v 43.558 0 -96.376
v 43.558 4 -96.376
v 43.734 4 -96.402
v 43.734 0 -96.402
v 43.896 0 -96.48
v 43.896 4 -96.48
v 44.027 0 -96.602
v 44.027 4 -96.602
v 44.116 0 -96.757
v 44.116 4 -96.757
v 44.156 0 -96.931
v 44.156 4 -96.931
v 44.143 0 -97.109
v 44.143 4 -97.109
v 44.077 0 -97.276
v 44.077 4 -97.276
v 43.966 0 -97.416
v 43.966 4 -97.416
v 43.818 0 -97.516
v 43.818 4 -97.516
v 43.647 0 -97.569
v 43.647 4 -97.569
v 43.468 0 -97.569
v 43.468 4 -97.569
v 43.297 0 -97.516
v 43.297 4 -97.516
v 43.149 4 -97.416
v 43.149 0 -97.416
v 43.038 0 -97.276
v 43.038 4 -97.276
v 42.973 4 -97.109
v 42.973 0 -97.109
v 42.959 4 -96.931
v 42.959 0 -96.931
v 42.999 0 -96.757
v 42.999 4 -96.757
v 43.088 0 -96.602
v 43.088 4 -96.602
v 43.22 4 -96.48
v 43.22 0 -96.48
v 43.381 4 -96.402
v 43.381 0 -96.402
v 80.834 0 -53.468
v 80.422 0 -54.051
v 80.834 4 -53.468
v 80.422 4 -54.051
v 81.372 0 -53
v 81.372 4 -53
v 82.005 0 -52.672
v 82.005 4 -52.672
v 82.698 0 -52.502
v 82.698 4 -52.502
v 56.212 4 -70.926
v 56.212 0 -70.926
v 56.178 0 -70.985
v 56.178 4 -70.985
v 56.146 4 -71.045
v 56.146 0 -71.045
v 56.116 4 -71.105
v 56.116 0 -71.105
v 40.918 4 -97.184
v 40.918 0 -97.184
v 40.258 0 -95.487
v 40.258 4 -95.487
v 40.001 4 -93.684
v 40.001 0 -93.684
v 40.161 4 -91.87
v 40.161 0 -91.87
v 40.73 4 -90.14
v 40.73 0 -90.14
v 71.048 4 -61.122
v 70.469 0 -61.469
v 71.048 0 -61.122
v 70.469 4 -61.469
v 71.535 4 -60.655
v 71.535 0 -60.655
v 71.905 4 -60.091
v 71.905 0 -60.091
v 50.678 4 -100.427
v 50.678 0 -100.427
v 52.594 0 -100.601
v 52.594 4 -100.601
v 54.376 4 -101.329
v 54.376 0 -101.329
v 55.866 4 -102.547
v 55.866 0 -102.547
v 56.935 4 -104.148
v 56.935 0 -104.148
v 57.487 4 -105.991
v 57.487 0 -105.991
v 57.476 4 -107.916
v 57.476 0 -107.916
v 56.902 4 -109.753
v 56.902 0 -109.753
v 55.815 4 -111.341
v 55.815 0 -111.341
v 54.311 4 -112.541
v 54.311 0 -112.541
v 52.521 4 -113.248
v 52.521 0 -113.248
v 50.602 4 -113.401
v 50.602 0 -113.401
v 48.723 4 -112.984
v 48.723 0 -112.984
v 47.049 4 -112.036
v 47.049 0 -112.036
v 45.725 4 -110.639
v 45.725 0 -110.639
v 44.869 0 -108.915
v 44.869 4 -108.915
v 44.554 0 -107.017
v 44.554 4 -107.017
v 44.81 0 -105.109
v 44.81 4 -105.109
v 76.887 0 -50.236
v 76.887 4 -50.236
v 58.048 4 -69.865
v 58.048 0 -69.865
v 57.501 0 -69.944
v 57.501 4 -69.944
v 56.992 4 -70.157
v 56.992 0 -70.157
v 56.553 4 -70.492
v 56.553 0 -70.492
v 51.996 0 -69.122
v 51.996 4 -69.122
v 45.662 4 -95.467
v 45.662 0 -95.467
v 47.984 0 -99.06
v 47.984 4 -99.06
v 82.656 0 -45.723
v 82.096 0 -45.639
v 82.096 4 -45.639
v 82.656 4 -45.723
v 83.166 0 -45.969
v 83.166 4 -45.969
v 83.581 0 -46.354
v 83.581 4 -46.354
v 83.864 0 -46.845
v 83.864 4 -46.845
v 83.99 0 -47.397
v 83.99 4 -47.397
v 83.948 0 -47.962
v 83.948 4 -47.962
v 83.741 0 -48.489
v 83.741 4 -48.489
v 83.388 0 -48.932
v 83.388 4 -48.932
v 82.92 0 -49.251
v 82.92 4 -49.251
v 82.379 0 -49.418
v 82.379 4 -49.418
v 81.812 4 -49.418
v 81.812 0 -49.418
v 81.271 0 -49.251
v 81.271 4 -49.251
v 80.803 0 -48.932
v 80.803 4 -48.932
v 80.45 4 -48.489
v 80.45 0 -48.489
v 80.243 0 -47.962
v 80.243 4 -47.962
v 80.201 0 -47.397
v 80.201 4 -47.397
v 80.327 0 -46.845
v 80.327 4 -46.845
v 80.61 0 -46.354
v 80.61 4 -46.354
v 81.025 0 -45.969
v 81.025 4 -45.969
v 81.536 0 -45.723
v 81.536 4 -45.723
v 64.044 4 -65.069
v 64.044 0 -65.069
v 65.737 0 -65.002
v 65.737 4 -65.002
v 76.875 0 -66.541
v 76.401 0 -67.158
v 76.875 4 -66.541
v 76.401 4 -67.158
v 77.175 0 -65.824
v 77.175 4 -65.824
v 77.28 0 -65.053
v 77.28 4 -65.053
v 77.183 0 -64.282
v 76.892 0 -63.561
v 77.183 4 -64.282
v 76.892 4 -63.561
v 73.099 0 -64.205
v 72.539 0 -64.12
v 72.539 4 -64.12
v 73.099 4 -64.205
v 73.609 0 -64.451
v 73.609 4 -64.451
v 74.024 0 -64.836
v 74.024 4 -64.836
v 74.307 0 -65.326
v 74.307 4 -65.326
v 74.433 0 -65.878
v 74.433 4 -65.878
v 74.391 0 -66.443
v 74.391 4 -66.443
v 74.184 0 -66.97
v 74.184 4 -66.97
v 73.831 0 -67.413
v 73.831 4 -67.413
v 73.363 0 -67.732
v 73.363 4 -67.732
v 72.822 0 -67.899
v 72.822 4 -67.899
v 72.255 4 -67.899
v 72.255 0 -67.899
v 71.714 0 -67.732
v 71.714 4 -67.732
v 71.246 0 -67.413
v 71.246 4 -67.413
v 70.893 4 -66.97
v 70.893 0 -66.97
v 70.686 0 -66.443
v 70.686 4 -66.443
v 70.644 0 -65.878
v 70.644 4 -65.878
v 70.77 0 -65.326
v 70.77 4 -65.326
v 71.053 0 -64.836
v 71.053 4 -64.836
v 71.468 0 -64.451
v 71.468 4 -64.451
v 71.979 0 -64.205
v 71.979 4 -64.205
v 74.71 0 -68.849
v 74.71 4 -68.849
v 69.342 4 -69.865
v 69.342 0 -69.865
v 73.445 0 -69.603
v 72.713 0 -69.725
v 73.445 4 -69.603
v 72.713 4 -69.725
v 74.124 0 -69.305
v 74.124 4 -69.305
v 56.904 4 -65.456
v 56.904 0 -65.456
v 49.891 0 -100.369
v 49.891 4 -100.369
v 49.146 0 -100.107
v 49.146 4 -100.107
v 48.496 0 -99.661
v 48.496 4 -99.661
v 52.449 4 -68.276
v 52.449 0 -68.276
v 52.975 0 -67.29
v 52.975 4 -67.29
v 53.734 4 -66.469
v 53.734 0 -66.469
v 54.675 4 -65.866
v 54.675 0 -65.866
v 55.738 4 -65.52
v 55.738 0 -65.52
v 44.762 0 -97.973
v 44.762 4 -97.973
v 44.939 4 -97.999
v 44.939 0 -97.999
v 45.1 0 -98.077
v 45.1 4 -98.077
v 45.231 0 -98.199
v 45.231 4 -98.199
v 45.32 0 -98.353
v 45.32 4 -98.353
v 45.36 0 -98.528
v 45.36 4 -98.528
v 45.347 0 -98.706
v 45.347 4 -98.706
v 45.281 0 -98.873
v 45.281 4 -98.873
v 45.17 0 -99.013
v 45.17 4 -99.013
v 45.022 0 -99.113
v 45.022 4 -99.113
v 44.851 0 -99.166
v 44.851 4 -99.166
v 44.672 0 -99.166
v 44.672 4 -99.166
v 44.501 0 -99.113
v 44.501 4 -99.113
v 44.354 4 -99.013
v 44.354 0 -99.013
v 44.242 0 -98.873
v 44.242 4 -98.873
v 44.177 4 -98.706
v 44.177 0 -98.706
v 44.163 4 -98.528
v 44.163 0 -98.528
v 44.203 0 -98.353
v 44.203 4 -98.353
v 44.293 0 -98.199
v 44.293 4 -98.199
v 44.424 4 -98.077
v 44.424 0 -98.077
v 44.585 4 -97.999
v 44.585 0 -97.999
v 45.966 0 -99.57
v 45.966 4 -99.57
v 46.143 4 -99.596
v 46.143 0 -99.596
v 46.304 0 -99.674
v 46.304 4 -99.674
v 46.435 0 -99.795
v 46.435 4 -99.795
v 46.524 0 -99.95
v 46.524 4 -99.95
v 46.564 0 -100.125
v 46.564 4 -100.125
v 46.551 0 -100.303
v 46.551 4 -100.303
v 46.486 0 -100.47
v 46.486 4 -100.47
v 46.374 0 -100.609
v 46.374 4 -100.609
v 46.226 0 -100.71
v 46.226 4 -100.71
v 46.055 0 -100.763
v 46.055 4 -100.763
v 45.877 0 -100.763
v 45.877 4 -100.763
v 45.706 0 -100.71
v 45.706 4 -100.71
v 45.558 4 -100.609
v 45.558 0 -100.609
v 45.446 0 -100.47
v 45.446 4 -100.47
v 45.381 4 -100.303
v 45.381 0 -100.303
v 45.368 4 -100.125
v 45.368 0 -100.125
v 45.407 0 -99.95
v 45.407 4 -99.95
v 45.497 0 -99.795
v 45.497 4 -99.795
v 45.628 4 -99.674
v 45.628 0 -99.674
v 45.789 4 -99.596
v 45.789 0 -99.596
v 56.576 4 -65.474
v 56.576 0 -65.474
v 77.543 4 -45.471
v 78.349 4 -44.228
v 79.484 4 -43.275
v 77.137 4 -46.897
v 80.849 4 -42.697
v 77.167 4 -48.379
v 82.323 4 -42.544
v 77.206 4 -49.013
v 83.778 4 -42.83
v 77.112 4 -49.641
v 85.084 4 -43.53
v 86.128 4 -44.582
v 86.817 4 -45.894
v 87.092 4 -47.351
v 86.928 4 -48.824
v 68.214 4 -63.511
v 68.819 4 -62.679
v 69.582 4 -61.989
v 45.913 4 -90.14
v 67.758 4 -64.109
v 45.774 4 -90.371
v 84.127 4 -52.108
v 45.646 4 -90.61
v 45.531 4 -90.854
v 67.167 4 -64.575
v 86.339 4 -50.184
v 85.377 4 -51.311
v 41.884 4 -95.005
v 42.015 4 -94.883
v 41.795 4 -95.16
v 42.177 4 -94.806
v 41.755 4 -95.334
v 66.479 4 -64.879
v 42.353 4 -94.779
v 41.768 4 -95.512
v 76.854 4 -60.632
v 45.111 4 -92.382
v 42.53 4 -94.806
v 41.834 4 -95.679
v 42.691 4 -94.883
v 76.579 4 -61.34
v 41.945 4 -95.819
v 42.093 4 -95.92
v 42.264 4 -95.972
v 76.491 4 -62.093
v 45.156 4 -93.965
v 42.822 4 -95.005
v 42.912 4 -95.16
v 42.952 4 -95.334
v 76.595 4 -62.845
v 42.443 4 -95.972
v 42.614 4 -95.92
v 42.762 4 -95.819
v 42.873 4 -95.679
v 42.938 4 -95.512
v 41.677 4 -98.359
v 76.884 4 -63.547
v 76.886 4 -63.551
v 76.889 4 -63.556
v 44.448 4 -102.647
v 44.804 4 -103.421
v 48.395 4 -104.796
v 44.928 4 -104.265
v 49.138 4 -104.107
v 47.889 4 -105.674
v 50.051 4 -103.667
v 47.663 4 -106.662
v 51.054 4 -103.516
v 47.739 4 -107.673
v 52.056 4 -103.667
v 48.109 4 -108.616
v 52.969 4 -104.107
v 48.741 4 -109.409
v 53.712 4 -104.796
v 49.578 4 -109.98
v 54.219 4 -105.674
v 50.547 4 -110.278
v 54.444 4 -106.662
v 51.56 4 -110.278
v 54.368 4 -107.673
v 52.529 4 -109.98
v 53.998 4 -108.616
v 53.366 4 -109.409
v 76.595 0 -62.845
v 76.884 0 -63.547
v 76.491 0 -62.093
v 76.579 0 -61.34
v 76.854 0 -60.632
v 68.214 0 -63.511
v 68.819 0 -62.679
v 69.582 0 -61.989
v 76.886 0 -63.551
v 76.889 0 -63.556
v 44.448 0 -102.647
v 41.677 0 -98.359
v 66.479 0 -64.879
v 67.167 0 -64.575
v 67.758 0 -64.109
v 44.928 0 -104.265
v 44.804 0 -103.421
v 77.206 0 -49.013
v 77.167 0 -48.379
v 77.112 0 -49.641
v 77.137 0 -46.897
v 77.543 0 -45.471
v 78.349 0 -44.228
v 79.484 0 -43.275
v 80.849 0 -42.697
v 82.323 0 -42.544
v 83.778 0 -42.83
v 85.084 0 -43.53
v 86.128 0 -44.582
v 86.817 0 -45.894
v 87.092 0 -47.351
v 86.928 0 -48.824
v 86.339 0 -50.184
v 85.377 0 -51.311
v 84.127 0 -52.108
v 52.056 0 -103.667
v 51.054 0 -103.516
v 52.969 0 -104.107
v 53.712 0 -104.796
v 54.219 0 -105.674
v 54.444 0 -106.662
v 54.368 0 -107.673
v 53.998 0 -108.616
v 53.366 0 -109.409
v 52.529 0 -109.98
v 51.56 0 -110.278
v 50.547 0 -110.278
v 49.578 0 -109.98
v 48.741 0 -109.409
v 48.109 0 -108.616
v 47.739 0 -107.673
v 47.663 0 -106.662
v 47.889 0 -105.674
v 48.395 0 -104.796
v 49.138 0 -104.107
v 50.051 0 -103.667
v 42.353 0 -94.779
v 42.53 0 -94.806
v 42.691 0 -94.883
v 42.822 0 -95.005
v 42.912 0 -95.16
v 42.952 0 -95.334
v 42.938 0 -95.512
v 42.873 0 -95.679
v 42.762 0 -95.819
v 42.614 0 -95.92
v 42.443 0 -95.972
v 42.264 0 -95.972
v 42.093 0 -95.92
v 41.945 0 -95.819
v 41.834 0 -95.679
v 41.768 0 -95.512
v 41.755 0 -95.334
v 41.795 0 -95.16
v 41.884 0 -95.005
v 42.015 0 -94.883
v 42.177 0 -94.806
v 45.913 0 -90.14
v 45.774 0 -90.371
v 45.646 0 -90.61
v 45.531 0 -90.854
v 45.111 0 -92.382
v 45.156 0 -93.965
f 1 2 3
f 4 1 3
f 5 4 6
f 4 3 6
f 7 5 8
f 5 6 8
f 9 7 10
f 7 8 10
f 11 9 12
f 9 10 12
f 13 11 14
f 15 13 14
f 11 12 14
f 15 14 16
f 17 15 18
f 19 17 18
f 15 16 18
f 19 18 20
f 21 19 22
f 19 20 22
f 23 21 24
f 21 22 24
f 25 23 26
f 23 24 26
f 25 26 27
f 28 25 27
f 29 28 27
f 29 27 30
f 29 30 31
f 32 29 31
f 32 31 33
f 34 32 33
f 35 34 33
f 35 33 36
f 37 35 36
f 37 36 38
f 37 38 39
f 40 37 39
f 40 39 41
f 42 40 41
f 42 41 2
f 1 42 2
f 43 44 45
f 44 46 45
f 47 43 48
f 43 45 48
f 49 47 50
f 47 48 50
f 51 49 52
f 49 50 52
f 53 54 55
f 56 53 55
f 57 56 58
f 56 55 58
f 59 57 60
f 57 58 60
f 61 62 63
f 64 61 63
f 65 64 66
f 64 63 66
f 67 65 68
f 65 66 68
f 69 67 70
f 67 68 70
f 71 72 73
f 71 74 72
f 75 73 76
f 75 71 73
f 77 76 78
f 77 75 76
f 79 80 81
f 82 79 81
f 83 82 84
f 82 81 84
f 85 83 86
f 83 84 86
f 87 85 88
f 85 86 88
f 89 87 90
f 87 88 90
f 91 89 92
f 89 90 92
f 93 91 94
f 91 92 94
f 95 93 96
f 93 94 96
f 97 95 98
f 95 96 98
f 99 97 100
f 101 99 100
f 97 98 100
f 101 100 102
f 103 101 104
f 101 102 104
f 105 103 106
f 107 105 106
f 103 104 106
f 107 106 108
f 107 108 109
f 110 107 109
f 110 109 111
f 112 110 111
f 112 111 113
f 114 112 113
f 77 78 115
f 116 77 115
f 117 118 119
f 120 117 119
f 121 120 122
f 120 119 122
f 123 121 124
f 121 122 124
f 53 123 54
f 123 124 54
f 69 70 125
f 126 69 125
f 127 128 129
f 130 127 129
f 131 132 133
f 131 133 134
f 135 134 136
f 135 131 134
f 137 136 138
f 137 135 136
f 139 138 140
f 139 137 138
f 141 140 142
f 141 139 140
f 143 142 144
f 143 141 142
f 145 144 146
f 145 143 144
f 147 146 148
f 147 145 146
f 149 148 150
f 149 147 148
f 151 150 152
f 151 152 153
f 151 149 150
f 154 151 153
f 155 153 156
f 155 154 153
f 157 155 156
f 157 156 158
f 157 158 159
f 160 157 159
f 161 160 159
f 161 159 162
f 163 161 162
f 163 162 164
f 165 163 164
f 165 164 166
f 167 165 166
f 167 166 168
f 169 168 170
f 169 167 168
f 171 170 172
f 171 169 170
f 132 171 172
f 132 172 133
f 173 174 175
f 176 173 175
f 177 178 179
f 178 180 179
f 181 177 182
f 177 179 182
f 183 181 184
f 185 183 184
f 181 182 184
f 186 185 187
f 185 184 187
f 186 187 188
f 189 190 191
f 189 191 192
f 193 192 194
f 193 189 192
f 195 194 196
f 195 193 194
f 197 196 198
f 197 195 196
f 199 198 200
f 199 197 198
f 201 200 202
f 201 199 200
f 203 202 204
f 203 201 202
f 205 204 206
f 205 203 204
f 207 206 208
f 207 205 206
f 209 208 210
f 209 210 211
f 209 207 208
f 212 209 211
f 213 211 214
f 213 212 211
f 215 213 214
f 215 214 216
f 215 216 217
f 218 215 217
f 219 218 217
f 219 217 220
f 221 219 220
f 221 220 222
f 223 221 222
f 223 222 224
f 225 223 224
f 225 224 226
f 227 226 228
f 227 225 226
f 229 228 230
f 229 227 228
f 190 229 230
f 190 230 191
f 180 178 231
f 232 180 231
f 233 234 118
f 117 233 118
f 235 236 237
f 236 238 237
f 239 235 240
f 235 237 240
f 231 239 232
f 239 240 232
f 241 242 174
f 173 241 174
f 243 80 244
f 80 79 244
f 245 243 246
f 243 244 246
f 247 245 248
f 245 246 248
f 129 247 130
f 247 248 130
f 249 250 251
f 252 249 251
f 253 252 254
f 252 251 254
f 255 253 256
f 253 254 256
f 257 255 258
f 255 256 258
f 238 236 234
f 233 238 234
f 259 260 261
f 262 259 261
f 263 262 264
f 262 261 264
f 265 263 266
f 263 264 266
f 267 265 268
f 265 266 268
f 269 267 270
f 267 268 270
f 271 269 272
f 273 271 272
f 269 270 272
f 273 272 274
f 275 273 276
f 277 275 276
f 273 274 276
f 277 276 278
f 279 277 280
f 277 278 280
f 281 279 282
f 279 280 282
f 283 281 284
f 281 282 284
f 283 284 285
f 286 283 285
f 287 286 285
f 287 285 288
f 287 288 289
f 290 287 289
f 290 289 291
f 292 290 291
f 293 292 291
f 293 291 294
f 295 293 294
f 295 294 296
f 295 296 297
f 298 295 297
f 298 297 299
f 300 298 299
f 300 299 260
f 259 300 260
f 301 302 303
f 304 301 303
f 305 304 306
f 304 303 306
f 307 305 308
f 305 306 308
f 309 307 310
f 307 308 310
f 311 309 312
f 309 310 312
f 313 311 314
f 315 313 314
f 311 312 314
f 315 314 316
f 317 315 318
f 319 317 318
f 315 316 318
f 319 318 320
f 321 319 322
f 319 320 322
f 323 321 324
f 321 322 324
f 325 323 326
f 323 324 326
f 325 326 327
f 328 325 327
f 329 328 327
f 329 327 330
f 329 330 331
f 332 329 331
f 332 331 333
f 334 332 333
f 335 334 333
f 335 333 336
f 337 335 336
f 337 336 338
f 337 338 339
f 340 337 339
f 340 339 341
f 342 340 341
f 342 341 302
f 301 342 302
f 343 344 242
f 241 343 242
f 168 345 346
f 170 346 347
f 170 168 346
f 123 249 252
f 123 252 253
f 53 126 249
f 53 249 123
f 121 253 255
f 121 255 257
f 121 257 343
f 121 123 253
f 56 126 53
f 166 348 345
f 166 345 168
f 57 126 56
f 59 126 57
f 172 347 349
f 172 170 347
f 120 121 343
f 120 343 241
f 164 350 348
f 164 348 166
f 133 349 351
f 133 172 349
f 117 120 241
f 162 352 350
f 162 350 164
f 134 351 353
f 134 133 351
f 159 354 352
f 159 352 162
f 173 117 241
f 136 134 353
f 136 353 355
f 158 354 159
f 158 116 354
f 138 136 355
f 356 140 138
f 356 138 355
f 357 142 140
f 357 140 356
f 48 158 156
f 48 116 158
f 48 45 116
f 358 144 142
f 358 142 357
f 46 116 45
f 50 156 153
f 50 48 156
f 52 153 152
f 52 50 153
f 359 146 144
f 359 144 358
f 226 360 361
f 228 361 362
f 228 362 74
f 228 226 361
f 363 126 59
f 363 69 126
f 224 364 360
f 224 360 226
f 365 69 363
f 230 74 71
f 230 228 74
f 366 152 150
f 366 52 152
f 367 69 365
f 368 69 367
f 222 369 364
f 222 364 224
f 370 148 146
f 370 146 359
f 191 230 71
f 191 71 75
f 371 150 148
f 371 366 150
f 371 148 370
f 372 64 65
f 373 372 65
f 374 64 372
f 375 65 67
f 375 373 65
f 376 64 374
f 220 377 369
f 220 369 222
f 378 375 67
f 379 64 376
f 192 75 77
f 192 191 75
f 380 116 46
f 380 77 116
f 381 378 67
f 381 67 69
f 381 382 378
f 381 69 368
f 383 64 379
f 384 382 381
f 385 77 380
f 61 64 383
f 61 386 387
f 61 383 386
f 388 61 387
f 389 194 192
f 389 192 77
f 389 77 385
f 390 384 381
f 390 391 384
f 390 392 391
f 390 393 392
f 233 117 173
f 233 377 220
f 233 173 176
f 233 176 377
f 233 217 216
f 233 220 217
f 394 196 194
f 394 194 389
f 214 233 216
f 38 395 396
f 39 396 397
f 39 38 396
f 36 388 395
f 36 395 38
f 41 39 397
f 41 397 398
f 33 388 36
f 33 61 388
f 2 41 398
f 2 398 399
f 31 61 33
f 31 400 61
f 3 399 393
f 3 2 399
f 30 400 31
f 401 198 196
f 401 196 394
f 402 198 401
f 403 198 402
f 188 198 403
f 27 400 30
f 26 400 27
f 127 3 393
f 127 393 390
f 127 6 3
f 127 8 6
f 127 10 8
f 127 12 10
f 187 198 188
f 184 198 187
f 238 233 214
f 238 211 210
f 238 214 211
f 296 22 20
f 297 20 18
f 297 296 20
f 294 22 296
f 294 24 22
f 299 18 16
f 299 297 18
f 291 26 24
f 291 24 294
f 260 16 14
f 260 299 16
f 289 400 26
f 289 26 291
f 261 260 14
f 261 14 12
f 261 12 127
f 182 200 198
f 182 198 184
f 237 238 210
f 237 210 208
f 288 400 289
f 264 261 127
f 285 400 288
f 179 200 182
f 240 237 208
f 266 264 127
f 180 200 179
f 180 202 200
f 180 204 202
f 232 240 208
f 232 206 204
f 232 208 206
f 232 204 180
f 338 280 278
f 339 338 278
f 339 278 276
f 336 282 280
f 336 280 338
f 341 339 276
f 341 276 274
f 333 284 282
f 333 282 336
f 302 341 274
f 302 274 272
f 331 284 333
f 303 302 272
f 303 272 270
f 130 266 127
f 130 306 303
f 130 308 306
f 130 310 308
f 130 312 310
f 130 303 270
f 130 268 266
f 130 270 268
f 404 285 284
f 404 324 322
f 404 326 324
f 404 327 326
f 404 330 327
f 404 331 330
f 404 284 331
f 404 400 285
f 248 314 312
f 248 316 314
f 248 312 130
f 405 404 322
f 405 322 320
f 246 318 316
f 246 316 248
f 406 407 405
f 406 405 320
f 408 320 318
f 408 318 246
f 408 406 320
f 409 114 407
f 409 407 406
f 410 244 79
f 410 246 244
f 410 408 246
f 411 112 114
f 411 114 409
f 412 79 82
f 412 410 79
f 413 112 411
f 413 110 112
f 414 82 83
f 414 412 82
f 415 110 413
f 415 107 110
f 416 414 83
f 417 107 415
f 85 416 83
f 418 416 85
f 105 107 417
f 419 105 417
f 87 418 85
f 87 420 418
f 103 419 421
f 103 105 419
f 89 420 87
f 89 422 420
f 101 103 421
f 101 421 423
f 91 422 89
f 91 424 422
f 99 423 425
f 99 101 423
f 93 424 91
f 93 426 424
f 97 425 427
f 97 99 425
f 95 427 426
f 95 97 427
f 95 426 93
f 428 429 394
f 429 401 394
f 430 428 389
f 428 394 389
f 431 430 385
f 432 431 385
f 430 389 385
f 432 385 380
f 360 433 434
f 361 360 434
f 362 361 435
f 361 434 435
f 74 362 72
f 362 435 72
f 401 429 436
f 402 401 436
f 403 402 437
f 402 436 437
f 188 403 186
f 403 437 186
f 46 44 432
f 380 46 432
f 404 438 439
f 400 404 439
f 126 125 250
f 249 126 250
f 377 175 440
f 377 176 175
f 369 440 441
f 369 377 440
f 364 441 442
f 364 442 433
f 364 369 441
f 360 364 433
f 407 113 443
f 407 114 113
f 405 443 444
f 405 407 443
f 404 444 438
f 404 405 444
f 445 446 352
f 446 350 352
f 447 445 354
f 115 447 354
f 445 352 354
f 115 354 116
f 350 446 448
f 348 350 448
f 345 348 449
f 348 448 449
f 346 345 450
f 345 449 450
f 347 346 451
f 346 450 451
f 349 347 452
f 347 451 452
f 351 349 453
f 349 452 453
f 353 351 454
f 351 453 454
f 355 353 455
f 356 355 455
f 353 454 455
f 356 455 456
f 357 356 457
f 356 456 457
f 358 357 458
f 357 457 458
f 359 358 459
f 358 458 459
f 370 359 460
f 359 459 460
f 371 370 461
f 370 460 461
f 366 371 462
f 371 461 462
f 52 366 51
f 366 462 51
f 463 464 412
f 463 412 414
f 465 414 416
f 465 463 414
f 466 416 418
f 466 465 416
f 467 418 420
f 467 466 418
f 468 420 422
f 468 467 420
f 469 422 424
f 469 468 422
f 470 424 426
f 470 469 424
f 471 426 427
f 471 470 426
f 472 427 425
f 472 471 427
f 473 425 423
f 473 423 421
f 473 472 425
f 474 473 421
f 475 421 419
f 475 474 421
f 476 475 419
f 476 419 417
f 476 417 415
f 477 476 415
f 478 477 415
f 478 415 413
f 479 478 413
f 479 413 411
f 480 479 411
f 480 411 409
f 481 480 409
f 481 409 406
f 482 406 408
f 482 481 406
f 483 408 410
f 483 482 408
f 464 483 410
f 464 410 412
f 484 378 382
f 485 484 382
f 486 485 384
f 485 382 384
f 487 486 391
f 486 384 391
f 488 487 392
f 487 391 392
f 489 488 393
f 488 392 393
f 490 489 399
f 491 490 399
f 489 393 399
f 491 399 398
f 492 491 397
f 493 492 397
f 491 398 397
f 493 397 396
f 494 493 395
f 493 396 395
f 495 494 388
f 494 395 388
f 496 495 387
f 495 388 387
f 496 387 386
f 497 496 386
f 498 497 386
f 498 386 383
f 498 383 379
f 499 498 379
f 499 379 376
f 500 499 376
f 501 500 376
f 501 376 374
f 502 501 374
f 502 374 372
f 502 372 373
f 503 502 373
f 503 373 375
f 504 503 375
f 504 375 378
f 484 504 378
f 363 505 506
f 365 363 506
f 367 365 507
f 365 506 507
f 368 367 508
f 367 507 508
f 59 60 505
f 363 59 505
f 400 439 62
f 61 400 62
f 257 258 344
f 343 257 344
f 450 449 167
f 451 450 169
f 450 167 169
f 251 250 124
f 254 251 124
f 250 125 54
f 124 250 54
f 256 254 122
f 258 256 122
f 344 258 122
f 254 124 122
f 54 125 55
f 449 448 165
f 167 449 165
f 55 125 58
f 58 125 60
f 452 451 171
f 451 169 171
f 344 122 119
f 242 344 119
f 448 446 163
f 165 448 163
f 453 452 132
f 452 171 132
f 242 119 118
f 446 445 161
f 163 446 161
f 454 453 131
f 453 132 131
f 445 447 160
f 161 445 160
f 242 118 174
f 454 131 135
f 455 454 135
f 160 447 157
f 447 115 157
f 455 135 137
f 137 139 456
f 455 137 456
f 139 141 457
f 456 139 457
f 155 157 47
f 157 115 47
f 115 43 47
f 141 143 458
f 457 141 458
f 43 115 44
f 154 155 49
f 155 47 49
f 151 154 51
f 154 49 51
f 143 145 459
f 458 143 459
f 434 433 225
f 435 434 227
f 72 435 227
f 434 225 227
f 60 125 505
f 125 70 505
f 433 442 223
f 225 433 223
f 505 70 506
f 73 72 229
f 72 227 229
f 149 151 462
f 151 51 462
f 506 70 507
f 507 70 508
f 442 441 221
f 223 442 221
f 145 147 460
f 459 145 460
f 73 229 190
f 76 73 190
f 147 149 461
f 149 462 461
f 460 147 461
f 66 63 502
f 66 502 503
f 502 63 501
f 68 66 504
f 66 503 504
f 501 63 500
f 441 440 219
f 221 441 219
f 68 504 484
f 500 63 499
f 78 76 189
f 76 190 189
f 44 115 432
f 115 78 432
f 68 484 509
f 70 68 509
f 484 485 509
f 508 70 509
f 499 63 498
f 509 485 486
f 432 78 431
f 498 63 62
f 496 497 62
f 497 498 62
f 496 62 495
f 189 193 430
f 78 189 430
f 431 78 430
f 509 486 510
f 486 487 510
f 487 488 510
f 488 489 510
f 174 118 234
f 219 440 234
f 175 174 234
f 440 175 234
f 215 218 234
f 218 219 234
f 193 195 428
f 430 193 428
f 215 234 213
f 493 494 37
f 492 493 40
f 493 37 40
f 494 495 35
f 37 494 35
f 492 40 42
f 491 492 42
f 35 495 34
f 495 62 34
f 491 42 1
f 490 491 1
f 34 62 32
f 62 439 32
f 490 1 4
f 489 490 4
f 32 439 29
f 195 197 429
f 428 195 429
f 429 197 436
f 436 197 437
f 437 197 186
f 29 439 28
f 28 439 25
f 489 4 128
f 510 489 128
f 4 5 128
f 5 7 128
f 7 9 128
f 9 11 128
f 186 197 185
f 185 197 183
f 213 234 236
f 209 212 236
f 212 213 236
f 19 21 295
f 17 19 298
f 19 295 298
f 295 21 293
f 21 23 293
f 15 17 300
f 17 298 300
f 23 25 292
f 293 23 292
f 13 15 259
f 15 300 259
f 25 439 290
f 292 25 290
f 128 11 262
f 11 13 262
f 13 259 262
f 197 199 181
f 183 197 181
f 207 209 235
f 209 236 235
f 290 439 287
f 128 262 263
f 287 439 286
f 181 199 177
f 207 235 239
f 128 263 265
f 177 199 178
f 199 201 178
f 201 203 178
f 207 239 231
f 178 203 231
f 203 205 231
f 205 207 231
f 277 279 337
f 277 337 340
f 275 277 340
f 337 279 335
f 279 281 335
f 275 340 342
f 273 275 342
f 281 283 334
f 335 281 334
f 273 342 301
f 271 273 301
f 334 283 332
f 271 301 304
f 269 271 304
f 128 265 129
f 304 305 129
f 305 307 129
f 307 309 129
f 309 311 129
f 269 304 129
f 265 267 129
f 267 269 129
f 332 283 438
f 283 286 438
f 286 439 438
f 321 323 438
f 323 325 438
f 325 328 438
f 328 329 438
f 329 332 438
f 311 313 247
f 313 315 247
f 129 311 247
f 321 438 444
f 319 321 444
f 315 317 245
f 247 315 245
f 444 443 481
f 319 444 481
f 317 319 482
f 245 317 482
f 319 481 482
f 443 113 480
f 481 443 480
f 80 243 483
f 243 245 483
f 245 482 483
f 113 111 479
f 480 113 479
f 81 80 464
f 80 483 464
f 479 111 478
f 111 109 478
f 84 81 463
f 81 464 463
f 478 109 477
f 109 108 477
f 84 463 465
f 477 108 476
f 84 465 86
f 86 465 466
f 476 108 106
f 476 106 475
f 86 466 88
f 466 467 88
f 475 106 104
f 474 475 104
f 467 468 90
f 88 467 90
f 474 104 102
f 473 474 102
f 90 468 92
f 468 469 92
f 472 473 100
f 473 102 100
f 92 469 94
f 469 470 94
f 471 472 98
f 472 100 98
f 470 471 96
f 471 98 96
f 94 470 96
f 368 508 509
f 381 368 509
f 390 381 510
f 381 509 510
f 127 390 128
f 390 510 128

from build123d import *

# Parameters (mm, degrees)
SKETCH2_R           = 1.9
SKETCH2_R_2         = 3.4
BOSS_EXTRUDE1_DEPTH = 4
SKETCH3_R           = 0.6
CUT_EXTRUDE1_DEPTH  = 6
FILLET1_R           = 3


with BuildPart() as part:
    # Sketch2 → Boss-Extrude1 (new body)
    with BuildSketch(Plane(origin=(0, 0, 0), x_dir=(1, 0, 0), z_dir=(0, 1, 0))):
        with BuildLine():
            ThreePointArc((49.0624911, 100.728722197), (55.253975507, 111.876765002), (45.278809785, 103.932622106))
            Line((45.278809785, 103.932622106), (41.677103445, 98.359455452))
            Line((41.677103445, 98.359455452), (40.917682236, 97.184351056))
            ThreePointArc((40.917682236, 97.184351056), (40.000914232, 93.684113367), (40.729811239, 90.139986308))
            Line((40.729811239, 90.139986308), (51.995593872, 69.121735128))
            Line((51.995593872, 69.121735128), (52.448751423, 68.276291936))
            ThreePointArc((52.448751423, 68.276291936), (53.733769558, 66.46917356), (55.737555004, 65.519546097))
            Line((55.737555004, 65.519546097), (56.575581952, 65.474059755))
            Line((56.575581952, 65.474059755), (56.904280571, 65.456218685))
            Line((56.904280571, 65.456218685), (64.043852088, 65.068697747))
            Line((64.043852088, 65.068697747), (67.659658755, 64.927019071))
            ThreePointArc((67.659658755, 64.927019071), (68.973857559, 62.514332624), (71.364365032, 61.16020988))
            Line((71.364365032, 61.16020988), (77.3922419, 49.235496946))
            ThreePointArc((77.3922419, 49.235496946), (85.295038859, 43.696471142), (81.278467798, 52.471558808))
            Line((81.278467798, 52.471558808), (75.926202221, 62.342787356))
            ThreePointArc((75.926202221, 62.342787356), (77.117833046, 64.012589982), (77.538655529, 66.020358214))
            Line((77.538655529, 66.020358214), (73.882441794, 69.676571949))
            Line((73.882441794, 69.676571949), (69.341583584, 69.864669723))
            Line((69.341583584, 69.864669723), (65.404712603, 69.864669723))
            Line((65.404712603, 69.864669723), (58.04793187, 69.864669723))
            ThreePointArc((58.04793187, 69.864669723), (56.992330015, 70.157110244), (56.212176606, 70.925990854))
            ThreePointArc((56.212176606, 70.925990854), (56.161986001, 71.014595828), (56.115987655, 71.105447853))
            Line((56.115987655, 71.105447853), (45.913475043, 90.139986308))
            ThreePointArc((45.913475043, 90.139986308), (45.708651409, 90.489699119), (45.530826332, 90.853883157))
            ThreePointArc((45.530826332, 90.853883157), (45.074746145, 93.175228741), (45.661998303, 95.466907026))
            Line((45.661998303, 95.466907026), (49.0624911, 100.728722197))
        make_face()
        with Locations(Location((82.095552315, 47.538773298, 0), (0, 0, 270))):
            Circle(SKETCH2_R, mode=Mode.SUBTRACT)
        with Locations(Location((72.538655529, 66.020358214, 0), (0, 0, 270))):
            Circle(SKETCH2_R, mode=Mode.SUBTRACT)
        with Locations(Location((51.053576092, 106.916256485, 0), (0, 0, 270))):
            Circle(SKETCH2_R_2, mode=Mode.SUBTRACT)
    extrude(amount=BOSS_EXTRUDE1_DEPTH)

    # Sketch3 → Cut-Extrude1 (cut)
    with BuildSketch(Plane(origin=(0, 4, 0), x_dir=(1, 0, 0), z_dir=(0, 1, 0))):
        with Locations(Location((42.353398584, 95.378951282, 0), (0, 0, 270))):
            Circle(SKETCH3_R)
        with Locations(Location((43.557575402, 96.975810134, 0), (0, 0, 270))):
            Circle(SKETCH3_R)
        with Locations(Location((44.761752219, 98.572668985, 0), (0, 0, 270))):
            Circle(SKETCH3_R)
        with Locations(Location((45.965929037, 100.169527837, 0), (0, 0, 270))):
            Circle(SKETCH3_R)
    extrude(amount=-CUT_EXTRUDE1_DEPTH, mode=Mode.SUBTRACT)

    # Fillet1
    fillet1_edges = [part.edges().sort_by_distance(p)[0] for p in [
        (71.364365032, 2, -61.16020988),
        (67.659658755, 2, -64.927019071),
        (45.278809785, 2, -103.932622106),
        (49.0624911, 2, -100.728722197),
        (73.882441794, 2, -69.676571949),
        (77.538655529, 2, -66.020358214),
        (75.926202221, 2, -62.342787356),
        (81.278467798, 2, -52.471558808),
        (77.3922419, 2, -49.235496946),
    ]]
    fillet(fillet1_edges, radius=FILLET1_R)


solid = part.part
